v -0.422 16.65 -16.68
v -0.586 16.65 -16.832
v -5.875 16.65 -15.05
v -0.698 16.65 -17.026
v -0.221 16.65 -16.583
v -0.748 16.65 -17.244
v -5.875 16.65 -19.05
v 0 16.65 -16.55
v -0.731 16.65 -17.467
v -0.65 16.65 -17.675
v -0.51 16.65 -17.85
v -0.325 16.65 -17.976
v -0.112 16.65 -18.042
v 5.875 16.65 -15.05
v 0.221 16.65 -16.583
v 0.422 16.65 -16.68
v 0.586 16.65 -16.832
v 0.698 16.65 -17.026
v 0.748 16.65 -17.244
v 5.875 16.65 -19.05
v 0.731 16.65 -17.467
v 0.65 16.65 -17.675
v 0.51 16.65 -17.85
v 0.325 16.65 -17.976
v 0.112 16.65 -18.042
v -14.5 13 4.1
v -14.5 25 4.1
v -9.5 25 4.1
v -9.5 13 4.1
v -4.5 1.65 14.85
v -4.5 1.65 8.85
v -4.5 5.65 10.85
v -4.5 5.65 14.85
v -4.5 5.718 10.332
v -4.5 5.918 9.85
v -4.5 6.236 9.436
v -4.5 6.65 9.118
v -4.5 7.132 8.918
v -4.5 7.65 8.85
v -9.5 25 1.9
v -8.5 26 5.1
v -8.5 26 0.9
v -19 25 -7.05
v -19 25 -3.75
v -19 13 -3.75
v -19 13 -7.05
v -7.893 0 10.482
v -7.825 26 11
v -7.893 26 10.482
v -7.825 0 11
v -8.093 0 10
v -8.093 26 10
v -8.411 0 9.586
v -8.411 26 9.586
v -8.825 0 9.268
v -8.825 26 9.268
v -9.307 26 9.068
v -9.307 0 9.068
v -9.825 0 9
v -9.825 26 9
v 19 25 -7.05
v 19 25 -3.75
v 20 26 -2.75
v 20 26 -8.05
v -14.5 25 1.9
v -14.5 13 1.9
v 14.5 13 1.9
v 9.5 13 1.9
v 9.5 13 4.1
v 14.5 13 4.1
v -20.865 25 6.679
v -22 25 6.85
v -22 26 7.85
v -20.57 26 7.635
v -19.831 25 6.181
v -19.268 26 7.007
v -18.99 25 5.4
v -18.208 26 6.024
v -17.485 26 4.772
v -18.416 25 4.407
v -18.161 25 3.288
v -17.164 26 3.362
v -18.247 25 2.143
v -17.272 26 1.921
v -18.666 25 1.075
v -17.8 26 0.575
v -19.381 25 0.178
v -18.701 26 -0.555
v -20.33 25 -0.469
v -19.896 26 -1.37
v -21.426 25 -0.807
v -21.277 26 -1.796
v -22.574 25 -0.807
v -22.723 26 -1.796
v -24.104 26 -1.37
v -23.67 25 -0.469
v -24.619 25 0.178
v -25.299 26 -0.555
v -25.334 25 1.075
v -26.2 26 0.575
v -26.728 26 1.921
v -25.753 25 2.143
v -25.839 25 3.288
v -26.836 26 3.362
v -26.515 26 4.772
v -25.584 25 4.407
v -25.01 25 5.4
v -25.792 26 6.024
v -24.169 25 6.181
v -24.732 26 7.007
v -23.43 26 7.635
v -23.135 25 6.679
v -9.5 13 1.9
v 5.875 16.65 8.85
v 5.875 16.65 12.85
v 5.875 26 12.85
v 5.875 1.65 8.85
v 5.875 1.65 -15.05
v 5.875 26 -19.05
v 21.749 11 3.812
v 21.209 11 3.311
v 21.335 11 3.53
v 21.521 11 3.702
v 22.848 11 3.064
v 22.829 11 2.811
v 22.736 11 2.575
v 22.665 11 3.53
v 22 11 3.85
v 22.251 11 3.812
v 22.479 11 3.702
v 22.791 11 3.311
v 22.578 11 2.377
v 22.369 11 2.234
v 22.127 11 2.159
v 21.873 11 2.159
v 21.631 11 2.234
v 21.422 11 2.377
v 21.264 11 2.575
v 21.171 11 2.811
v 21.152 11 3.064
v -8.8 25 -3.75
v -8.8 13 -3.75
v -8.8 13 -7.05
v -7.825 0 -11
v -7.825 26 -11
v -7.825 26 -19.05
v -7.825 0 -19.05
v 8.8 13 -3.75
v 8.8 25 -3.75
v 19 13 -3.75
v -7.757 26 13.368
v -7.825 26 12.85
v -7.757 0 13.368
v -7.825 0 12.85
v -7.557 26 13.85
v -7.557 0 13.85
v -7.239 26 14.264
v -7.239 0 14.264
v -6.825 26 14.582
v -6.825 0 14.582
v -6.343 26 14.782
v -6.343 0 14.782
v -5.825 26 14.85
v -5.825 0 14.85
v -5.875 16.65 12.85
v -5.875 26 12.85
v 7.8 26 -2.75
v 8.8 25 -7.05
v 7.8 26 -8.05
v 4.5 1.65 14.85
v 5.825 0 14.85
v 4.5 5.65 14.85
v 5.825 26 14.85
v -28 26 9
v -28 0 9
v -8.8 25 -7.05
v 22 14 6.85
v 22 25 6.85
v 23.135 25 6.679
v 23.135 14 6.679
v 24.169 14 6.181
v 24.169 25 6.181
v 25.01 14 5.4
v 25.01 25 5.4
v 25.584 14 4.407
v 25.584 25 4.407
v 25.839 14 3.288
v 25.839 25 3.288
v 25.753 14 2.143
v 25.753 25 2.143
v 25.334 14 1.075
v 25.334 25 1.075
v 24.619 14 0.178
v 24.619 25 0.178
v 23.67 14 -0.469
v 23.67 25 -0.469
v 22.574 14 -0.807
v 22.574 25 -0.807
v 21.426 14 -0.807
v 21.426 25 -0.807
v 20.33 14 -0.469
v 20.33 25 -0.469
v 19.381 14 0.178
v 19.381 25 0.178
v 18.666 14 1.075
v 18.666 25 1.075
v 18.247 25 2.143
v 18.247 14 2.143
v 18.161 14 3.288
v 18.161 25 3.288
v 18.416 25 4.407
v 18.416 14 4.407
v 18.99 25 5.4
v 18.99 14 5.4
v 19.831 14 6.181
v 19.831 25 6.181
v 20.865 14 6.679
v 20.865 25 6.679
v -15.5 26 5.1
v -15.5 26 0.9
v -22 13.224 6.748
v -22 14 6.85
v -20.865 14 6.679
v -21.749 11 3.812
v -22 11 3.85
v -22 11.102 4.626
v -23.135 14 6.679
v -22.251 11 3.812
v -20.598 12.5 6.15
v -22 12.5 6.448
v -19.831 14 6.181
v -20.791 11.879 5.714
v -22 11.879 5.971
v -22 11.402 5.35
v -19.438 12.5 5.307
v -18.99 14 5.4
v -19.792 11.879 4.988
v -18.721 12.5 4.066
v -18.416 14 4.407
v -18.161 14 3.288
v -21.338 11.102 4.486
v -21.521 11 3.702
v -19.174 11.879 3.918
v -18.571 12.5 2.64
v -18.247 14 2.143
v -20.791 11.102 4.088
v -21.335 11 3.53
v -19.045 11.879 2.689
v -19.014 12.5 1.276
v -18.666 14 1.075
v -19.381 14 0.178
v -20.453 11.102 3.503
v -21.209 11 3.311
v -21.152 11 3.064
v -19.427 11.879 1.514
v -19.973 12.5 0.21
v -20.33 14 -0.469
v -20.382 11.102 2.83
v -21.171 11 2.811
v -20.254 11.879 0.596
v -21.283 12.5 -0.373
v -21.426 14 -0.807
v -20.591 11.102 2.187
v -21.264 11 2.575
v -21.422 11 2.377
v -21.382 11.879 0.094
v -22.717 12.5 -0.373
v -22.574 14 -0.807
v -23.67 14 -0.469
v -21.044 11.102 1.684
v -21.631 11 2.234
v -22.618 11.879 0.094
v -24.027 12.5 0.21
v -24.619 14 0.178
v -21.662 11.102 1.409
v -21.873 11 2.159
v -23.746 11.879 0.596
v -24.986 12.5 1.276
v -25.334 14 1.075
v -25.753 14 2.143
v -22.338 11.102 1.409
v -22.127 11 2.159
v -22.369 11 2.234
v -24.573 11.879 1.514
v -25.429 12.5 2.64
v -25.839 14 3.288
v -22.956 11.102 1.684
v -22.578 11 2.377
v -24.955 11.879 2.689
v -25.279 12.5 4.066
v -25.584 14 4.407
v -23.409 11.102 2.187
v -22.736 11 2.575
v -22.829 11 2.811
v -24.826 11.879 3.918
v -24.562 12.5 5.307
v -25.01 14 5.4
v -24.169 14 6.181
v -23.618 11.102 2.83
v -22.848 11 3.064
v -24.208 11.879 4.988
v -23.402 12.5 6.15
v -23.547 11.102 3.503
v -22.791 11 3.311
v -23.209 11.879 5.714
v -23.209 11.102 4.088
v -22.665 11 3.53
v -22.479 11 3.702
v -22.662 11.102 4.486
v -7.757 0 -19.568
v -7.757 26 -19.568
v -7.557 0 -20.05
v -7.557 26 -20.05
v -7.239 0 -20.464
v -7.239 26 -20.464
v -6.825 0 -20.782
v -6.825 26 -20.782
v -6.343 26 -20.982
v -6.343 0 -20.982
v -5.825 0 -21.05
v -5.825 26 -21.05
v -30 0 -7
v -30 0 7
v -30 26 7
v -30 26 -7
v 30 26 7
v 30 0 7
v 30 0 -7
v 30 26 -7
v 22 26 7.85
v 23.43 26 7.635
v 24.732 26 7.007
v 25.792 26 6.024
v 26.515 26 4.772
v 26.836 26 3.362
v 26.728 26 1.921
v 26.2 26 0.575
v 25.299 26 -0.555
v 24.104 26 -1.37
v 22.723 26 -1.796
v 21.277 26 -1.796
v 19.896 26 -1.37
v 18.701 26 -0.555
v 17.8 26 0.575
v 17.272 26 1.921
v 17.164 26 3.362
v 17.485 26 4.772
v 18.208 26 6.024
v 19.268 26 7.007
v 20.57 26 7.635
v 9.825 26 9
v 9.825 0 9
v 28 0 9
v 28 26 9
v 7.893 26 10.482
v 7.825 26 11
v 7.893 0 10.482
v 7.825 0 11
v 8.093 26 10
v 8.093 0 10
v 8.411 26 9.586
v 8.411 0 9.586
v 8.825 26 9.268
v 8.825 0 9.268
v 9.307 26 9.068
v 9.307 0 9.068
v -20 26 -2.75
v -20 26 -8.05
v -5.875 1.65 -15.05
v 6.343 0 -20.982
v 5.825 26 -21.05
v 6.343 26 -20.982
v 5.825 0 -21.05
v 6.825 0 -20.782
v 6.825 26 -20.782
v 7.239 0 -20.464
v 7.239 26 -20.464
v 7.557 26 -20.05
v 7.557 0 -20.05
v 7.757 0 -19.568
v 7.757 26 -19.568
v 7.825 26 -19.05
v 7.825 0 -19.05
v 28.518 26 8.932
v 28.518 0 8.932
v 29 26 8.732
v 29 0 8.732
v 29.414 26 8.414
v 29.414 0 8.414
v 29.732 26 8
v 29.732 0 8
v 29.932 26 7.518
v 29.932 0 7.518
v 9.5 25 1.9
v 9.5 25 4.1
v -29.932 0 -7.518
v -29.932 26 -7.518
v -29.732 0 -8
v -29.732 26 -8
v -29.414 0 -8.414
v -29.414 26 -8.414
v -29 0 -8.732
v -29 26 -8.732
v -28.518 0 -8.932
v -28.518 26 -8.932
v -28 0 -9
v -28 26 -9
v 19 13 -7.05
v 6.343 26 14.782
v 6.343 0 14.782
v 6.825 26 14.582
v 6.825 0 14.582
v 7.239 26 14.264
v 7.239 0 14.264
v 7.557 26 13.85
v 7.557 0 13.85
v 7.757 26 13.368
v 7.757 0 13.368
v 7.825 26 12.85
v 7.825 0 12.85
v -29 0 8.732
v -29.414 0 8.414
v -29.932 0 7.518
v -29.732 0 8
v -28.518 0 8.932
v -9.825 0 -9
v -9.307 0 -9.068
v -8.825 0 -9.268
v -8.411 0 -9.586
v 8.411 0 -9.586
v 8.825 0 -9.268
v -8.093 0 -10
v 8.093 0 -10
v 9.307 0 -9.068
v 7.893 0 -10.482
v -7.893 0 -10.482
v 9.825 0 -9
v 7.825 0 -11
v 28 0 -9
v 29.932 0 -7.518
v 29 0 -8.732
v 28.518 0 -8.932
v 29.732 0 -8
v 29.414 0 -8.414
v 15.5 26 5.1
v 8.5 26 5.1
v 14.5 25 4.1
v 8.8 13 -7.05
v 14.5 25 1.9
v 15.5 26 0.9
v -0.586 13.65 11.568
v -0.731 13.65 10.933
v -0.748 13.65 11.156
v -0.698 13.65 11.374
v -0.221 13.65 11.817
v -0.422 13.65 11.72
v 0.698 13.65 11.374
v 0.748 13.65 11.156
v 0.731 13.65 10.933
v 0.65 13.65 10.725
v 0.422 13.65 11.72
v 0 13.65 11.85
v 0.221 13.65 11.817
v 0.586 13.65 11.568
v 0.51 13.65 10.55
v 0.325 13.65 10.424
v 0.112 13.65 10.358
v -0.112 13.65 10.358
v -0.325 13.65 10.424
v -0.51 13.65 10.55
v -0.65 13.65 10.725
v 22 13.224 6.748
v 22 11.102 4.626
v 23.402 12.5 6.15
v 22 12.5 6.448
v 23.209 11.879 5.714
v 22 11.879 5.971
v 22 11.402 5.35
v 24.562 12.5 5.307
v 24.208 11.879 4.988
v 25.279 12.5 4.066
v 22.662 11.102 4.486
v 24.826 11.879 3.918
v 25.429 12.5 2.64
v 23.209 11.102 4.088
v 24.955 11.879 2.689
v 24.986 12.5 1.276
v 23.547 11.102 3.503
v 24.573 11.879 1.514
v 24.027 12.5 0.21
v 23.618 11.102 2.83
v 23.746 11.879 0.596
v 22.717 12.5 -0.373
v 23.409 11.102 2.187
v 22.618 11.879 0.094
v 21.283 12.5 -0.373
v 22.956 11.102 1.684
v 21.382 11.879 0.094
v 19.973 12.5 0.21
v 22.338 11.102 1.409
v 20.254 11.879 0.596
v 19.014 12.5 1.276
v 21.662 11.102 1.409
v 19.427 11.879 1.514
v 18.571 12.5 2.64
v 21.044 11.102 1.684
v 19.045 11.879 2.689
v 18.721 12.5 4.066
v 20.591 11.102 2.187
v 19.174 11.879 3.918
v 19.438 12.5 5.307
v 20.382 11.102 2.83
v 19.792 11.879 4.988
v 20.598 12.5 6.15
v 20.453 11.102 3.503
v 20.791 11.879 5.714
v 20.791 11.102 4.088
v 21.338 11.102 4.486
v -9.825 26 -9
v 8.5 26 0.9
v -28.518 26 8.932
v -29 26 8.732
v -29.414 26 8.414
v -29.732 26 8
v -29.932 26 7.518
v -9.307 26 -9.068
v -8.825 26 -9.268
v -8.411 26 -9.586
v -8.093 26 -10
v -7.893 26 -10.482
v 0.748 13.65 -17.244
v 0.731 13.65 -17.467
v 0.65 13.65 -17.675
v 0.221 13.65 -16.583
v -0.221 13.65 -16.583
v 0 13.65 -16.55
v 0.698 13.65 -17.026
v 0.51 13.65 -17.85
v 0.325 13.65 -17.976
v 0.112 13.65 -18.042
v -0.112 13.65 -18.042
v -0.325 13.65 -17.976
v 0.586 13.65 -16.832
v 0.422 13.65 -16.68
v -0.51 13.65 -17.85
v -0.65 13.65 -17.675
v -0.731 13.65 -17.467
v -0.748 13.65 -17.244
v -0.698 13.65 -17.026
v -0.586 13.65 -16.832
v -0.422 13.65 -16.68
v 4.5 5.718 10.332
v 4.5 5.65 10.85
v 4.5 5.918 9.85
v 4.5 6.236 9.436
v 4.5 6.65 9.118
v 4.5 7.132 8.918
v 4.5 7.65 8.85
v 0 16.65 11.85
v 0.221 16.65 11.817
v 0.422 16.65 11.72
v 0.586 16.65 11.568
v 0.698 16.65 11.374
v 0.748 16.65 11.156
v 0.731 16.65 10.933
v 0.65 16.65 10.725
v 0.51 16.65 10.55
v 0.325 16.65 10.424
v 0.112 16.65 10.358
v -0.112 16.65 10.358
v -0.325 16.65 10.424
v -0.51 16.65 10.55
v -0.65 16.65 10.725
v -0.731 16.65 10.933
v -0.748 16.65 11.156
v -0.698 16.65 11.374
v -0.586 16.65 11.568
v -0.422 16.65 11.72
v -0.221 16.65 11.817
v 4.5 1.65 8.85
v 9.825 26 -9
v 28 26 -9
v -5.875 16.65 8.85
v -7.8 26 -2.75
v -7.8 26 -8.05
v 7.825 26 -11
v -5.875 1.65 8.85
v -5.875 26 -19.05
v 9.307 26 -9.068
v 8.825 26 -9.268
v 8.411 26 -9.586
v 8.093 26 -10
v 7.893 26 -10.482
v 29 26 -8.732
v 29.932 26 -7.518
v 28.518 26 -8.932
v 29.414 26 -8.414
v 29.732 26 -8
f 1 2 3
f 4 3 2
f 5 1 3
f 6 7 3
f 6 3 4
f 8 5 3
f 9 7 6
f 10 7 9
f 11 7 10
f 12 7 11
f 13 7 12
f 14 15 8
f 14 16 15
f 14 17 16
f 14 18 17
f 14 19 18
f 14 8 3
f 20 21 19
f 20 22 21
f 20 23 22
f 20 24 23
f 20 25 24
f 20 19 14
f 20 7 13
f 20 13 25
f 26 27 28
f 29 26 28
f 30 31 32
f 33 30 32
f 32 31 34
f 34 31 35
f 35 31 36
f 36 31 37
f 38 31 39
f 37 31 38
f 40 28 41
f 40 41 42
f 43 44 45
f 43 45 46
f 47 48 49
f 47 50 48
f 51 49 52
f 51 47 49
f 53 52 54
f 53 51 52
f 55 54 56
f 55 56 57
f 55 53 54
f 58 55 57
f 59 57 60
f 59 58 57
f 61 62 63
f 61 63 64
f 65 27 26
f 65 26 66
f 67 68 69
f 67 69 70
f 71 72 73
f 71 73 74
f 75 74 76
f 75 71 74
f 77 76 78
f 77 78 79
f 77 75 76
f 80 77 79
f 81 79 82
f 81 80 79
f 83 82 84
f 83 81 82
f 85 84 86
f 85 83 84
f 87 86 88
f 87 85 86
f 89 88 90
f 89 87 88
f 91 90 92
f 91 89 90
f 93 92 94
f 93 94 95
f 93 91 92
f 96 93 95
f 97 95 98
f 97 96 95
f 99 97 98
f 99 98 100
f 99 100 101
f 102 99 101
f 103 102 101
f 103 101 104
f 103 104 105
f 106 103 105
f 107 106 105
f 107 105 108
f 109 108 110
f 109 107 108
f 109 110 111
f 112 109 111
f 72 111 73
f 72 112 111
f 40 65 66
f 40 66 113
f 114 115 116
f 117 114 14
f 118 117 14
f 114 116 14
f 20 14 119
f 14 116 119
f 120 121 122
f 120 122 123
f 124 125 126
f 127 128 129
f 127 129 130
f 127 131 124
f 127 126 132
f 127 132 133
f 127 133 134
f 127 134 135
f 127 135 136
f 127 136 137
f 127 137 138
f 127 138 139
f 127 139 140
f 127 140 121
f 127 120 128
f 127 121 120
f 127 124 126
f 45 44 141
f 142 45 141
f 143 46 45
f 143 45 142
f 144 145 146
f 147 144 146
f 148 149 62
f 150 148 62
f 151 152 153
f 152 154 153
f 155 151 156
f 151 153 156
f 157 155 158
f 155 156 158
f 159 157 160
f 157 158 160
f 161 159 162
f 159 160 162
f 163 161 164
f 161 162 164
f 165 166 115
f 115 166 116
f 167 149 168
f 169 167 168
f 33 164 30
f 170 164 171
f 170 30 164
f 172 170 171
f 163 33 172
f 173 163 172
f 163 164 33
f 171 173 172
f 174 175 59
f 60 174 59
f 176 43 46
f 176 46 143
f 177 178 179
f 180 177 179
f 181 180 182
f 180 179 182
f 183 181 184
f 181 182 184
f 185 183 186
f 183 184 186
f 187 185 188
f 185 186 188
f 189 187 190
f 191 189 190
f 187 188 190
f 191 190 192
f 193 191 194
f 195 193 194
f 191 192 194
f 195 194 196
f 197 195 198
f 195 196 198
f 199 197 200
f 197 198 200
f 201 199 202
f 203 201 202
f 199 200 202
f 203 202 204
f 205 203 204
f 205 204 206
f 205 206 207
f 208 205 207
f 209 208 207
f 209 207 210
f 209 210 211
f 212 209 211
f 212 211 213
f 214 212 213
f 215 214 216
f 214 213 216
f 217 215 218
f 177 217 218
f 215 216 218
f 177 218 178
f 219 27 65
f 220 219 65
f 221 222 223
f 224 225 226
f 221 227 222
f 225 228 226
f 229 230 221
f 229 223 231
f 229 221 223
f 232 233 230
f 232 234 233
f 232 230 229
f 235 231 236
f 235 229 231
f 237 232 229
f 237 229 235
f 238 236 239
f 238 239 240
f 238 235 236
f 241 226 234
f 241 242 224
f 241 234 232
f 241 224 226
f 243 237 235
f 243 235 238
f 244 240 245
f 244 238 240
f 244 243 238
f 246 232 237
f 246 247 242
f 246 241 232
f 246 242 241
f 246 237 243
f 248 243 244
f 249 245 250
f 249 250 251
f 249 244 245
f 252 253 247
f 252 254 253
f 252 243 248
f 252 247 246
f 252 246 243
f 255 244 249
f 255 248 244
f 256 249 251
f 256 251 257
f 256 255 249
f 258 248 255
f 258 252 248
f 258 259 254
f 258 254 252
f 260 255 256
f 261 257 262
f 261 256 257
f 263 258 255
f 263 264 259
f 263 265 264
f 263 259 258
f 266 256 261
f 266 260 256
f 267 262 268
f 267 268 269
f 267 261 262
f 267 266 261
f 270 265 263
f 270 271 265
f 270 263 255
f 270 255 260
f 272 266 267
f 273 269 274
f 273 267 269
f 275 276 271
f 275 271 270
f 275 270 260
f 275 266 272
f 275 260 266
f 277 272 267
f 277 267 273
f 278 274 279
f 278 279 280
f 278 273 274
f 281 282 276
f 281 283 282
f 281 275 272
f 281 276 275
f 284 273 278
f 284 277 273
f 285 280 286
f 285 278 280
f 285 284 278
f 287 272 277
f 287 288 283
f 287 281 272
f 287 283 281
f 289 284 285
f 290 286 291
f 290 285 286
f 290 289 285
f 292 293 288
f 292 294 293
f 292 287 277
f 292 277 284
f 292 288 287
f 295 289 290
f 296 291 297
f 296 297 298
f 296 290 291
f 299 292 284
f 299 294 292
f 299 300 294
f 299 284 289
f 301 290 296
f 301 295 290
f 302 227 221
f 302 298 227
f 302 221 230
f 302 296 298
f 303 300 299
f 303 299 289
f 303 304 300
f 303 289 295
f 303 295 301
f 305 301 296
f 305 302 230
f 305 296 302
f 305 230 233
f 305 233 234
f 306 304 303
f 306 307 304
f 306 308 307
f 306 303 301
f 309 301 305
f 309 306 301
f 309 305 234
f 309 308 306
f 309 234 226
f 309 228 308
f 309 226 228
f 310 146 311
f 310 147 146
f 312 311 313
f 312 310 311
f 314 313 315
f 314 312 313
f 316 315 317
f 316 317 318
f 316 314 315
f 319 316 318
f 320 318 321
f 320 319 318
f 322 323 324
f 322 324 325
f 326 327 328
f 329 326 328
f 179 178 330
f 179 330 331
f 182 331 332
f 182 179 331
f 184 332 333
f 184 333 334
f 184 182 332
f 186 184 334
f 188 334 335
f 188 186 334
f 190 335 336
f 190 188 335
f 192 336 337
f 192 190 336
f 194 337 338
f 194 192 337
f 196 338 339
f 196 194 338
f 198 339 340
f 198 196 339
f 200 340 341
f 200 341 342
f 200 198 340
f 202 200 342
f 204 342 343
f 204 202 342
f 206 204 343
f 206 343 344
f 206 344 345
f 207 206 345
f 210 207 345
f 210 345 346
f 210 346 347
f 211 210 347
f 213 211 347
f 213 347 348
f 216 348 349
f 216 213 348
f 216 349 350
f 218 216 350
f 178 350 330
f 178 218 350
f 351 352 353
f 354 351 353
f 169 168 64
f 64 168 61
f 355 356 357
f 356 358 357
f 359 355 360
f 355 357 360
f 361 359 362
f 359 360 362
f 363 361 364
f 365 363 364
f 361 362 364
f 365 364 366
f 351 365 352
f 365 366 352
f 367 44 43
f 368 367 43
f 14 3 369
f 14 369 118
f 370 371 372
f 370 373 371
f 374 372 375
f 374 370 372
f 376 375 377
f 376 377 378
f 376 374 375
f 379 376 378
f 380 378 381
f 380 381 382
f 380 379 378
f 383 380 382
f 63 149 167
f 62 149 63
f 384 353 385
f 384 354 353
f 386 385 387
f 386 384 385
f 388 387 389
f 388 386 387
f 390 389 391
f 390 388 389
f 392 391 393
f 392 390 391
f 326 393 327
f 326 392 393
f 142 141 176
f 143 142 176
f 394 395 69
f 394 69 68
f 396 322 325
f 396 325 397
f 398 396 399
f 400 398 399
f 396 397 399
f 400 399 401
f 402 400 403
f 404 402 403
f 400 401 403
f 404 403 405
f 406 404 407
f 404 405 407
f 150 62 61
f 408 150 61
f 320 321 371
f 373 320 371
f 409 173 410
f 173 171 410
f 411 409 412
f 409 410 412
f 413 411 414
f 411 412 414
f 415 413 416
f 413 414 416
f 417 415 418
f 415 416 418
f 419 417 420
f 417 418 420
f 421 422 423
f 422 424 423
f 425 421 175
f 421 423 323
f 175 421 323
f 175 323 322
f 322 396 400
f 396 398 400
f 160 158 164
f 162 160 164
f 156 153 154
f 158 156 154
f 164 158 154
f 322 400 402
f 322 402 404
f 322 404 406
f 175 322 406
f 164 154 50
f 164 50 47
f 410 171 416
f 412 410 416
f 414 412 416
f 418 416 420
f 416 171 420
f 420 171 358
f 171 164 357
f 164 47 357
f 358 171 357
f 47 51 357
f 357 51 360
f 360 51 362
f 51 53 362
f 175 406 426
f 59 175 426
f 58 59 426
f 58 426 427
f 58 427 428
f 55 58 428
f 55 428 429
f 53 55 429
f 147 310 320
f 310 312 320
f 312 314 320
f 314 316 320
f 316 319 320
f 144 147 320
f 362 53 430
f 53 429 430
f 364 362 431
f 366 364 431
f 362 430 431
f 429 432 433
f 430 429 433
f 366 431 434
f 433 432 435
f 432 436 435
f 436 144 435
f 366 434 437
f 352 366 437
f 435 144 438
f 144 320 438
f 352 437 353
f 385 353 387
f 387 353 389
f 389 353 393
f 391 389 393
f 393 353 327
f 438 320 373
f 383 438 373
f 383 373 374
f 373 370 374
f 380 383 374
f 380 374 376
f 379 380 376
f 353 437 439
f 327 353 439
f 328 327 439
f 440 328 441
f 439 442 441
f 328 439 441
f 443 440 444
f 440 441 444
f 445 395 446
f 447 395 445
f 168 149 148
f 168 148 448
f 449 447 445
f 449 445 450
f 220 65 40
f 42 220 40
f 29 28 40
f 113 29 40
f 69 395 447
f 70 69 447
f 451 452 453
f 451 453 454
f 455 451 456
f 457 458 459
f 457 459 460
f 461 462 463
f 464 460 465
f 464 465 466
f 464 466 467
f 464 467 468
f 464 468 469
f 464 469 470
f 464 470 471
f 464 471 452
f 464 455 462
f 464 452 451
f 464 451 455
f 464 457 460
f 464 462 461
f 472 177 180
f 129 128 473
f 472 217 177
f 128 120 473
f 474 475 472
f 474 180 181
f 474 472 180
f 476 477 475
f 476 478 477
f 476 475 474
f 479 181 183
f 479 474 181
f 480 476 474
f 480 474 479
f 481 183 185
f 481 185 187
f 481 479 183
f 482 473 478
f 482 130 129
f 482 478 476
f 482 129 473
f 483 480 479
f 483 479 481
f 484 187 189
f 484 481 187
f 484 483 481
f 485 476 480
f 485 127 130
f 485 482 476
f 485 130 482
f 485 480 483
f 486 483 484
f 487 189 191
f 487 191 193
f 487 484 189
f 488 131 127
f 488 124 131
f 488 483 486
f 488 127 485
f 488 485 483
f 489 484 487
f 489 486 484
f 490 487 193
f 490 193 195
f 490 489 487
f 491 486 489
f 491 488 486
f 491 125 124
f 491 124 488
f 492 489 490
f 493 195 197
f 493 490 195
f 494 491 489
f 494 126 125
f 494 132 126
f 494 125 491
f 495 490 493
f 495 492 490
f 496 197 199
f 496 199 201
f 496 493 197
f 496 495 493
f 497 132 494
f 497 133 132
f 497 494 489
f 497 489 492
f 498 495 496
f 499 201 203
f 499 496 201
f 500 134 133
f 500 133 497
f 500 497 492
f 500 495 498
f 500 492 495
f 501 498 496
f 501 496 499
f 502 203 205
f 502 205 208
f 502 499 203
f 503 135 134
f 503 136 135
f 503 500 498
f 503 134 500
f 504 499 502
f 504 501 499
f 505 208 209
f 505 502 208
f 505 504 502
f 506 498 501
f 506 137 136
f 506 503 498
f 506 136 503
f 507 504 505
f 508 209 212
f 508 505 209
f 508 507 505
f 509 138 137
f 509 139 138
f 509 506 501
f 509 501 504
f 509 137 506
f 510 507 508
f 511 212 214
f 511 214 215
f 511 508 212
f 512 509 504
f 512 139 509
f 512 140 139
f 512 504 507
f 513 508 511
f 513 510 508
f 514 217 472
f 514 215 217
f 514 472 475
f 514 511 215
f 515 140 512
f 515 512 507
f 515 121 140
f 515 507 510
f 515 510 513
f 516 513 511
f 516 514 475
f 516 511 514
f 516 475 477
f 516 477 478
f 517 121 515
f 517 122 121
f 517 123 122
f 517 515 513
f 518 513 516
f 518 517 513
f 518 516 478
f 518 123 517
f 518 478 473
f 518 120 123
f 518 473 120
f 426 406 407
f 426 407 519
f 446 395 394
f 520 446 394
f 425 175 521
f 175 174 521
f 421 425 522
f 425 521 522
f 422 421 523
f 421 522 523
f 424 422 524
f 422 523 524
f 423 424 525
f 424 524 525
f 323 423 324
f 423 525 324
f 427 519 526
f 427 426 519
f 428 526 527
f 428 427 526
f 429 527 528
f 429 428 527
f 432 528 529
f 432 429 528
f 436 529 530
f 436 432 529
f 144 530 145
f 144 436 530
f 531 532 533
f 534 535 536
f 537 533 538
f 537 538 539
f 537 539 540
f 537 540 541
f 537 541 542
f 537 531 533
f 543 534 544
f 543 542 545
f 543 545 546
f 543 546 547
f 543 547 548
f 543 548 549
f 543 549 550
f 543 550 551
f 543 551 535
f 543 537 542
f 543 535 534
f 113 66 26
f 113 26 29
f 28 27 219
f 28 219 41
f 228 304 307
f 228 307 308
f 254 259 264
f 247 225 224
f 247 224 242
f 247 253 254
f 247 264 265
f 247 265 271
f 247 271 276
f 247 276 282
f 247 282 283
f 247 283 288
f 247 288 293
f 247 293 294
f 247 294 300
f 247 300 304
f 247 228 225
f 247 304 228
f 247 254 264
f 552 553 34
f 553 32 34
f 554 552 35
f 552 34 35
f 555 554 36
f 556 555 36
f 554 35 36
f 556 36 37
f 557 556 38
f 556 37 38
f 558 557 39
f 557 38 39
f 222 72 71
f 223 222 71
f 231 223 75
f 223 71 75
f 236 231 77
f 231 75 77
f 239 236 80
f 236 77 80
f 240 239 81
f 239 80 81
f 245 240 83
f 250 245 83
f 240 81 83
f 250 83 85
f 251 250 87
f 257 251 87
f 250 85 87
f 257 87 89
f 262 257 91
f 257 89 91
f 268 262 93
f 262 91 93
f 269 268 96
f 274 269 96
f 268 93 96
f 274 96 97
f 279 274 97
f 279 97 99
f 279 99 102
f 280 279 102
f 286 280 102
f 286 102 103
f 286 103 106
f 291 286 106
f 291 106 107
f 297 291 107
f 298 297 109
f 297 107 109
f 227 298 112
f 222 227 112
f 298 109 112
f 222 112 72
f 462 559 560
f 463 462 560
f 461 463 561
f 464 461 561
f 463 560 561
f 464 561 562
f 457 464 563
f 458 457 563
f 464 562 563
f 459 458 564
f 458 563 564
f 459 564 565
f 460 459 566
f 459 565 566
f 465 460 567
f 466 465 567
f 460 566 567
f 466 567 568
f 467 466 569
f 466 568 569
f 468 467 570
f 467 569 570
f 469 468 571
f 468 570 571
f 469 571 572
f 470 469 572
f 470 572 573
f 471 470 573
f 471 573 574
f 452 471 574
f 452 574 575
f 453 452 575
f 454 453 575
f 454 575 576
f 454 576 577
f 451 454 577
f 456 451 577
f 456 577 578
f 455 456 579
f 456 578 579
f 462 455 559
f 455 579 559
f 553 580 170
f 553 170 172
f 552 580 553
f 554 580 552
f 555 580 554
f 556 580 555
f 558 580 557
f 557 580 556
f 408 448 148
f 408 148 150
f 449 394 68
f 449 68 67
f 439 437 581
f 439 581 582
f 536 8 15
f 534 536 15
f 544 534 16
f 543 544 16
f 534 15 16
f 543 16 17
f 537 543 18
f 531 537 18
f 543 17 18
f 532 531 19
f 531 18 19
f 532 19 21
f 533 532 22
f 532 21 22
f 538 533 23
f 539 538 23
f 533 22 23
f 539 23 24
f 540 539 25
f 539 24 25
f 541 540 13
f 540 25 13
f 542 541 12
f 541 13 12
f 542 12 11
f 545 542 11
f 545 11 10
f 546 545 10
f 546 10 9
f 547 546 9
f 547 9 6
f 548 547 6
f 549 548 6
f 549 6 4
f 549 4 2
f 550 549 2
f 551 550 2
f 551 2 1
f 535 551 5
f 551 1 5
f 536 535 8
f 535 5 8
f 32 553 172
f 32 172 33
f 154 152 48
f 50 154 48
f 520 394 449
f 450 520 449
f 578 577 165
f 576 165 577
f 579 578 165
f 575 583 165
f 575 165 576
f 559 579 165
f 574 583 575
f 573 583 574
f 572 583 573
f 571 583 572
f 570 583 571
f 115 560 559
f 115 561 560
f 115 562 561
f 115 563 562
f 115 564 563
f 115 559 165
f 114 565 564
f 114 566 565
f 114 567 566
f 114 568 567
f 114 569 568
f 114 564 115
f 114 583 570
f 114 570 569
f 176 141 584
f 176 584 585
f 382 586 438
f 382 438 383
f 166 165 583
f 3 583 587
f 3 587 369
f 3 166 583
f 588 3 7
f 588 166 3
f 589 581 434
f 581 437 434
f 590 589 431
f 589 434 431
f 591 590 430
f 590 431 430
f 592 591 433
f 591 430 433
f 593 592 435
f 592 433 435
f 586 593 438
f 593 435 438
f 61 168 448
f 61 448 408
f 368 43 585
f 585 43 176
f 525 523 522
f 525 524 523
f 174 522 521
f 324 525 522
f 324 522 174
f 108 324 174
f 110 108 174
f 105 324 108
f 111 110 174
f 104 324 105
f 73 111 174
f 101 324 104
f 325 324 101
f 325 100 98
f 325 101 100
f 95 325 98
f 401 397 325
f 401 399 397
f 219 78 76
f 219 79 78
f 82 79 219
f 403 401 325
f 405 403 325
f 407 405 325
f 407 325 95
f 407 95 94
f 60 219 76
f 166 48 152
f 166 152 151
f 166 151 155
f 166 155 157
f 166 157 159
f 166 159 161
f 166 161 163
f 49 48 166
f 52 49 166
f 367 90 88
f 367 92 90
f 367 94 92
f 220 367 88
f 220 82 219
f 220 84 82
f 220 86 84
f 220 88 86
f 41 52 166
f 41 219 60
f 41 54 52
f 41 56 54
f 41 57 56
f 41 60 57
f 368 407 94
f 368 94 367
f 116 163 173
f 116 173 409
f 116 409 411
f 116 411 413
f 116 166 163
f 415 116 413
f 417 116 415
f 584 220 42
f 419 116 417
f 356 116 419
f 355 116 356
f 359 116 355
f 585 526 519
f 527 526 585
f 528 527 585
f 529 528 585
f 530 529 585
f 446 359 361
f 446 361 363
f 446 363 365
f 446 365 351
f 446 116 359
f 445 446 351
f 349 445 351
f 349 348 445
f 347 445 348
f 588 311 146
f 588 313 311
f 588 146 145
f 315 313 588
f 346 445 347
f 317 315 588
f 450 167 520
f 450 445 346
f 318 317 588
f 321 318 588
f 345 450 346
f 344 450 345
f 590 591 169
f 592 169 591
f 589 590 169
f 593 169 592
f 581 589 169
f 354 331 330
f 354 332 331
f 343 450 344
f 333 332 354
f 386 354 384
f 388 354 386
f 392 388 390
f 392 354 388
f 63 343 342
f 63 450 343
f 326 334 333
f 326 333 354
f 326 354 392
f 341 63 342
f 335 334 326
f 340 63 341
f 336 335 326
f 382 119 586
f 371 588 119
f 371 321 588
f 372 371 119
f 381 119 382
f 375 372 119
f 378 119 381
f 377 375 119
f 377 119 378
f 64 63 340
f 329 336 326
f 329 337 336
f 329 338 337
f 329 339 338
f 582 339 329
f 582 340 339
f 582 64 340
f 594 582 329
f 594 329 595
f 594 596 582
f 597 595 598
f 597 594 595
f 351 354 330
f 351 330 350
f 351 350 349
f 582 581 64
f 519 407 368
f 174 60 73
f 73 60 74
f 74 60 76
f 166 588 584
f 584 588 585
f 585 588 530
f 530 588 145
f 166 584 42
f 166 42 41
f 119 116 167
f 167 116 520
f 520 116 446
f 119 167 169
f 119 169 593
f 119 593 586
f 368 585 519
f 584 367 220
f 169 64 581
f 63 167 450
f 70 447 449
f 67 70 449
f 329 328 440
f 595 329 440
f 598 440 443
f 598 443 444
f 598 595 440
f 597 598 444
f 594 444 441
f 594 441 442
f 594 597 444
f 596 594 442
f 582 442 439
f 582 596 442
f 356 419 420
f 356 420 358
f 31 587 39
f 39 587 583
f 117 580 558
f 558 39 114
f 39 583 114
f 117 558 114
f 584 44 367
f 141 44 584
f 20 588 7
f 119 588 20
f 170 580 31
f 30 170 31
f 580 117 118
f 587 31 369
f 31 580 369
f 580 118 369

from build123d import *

# Parameters (mm, degrees)
SKETCH1_W             = 60
SKETCH1_H             = 18
BOSS_EXTRUDE1_DEPTH   = 26
SKETCH2_R             = 3.85
EYESHAFT_HOLES_DEPTH  = 15
EYESHAFT_FILLET_R     = 3
SKETCH5_W             = 5
SKETCH5_H             = 2.2
FRONT_LEG_HOLES_DEPTH = 13
SKETCH7_W             = 10.2
SKETCH7_H             = 3.3
BACK_LEGS_DEPTH       = 13
SKETCH18_W            = 15.65
SKETCH18_H            = 35.9
BOSS_EXTRUDE2_DEPTH   = 26
SKETCH19_W            = 11.75
SKETCH19_H            = 31.9
CUT_EXTRUDE9_DEPTH    = 9.35
SKETCH20_W            = 11.75
SKETCH20_H            = 23.9
CUT_EXTRUDE10_DEPTH   = 15
FILLET4_R             = 2
CHAMFER1_SIZE         = 1
SKETCH21_W            = 9
SKETCH21_H            = 4
CUT_EXTRUDE11_DEPTH   = 15
FILLET5_R             = 2
SKETCH22_R            = 0.75
CUT_EXTRUDE12_DEPTH   = 3


with BuildPart() as part:
    # Sketch1 → Boss-Extrude1 (new body)
    with BuildSketch(Plane(origin=(0, 0, 0), x_dir=(1, 0, 0), z_dir=(0, 1, 0))):
        Rectangle(SKETCH1_W, SKETCH1_H)
    extrude(amount=BOSS_EXTRUDE1_DEPTH)

    # Sketch2 → Eyeshaft holes (cut)
    with BuildSketch(Plane(origin=(0, 26, 0), x_dir=(1, 0, 0), z_dir=(0, 1, 0))):
        with Locations(Location((-22, -3, 0), (0, 0, 270))):
            Circle(SKETCH2_R)
        with Locations(Location((22, -3, 0), (0, 0, 270))):
            Circle(SKETCH2_R)
    extrude(amount=-EYESHAFT_HOLES_DEPTH, mode=Mode.SUBTRACT)

    # Eyeshaft Fillet
    eyeshaft_fillet_edges = [part.edges().sort_by_distance(p)[0] for p in [
        (-22, 11, -0.85),
        (22, 11, -0.85),
    ]]
    fillet(eyeshaft_fillet_edges, radius=EYESHAFT_FILLET_R)

    # Sketch5 → Front leg holes (cut)
    with BuildSketch(Plane(origin=(0, 26, 0), x_dir=(1, 0, 0), z_dir=(0, 1, 0))):
        with Locations((-12, -3)):
            Rectangle(SKETCH5_W, SKETCH5_H)
        with Locations((12, -3)):
            Rectangle(SKETCH5_W, SKETCH5_H)
    extrude(amount=-FRONT_LEG_HOLES_DEPTH, mode=Mode.SUBTRACT)

    # Sketch7 → Back Legs (cut)
    with BuildSketch(Plane(origin=(0, 26, 0), x_dir=(1, 0, 0), z_dir=(0, 1, 0))):
        with Locations((-13.9, 5.4)):
            Rectangle(SKETCH7_W, SKETCH7_H)
        with Locations((13.9, 5.4)):
            Rectangle(SKETCH7_W, SKETCH7_H)
    extrude(amount=-BACK_LEGS_DEPTH, mode=Mode.SUBTRACT)

    # Sketch18 → Boss-Extrude2 (add)
    with BuildSketch(Plane(origin=(0, 26, 0), x_dir=(1, 0, 0), z_dir=(0, 1, 0))):
        with Locations((0, 3.1)):
            Rectangle(SKETCH18_W, SKETCH18_H)
    extrude(amount=-BOSS_EXTRUDE2_DEPTH)

    # Sketch19 → Cut-Extrude9 (cut)
    with BuildSketch(Plane(origin=(0, 26, 0), x_dir=(1, 0, 0), z_dir=(0, 1, 0))):
        with Locations((0, 3.1)):
            Rectangle(SKETCH19_W, SKETCH19_H)
    extrude(amount=-CUT_EXTRUDE9_DEPTH, mode=Mode.SUBTRACT)

    # Sketch20 → Cut-Extrude10 (cut)
    with BuildSketch(Plane(origin=(0, 16.65, 0), x_dir=(1, 0, 0), z_dir=(0, 1, 0))):
        with Locations((0, 3.1)):
            Rectangle(SKETCH20_W, SKETCH20_H)
    extrude(amount=-CUT_EXTRUDE10_DEPTH, mode=Mode.SUBTRACT)

    # Fillet4
    fillet4_edges = [part.edges().sort_by_distance(p)[0] for p in [
        (30, 13, 9),
        (-30, 13, 9),
        (-30, 13, -9),
        (30, 13, -9),
        (-7.825, 13, 14.85),
        (7.825, 13, -21.05),
        (-7.825, 13, -21.05),
        (-7.825, 13, -9),
        (-7.825, 13, 9),
        (7.825, 13, 14.85),
        (7.825, 13, -9),
        (7.825, 13, 9),
    ]]
    fillet(fillet4_edges, radius=FILLET4_R)

    # Chamfer1
    chamfer1_edges = [part.edges().sort_by_distance(p)[0] for p in [
        (-22, 26, -0.85),
        (22, 26, -0.85),
        (-9.5, 26, 3),
        (-12, 26, 1.9),
        (-14.5, 26, 3),
        (-12, 26, 4.1),
        (14.5, 26, 3),
        (12, 26, 1.9),
        (9.5, 26, 3),
        (12, 26, 4.1),
        (-19, 26, -5.4),
        (-13.9, 26, -3.75),
        (-8.8, 26, -5.4),
        (-13.9, 26, -7.05),
        (8.8, 26, -5.4),
        (13.9, 26, -3.75),
        (19, 26, -5.4),
        (13.9, 26, -7.05),
    ]]
    chamfer(chamfer1_edges, length=CHAMFER1_SIZE)

    # Sketch21 → Cut-Extrude11 (cut)
    with BuildSketch(Plane(origin=(0, 0, 8.85), x_dir=(-1, 0, 0), z_dir=(0, 0, -1))):
        with Locations((0, 3.65)):
            Rectangle(SKETCH21_W, SKETCH21_H)
    extrude(amount=-CUT_EXTRUDE11_DEPTH, mode=Mode.SUBTRACT)

    # Fillet5
    fillet5_edges = [part.edges().sort_by_distance(p)[0] for p in [
        (0, 5.65, 8.85),
    ]]
    fillet(fillet5_edges, radius=FILLET5_R)

    # Sketch22 → Cut-Extrude12 (cut)
    with BuildSketch(Plane(origin=(0, 16.65, 0), x_dir=(1, 0, 0), z_dir=(0, 1, 0))):
        with Locations(Location((0, 17.3, 0), (0, 0, 270))):
            Circle(SKETCH22_R)
        with Locations(Location((0, -11.1, 0), (0, 0, 270))):
            Circle(SKETCH22_R)
    extrude(amount=-CUT_EXTRUDE12_DEPTH, mode=Mode.SUBTRACT)


solid = part.part
